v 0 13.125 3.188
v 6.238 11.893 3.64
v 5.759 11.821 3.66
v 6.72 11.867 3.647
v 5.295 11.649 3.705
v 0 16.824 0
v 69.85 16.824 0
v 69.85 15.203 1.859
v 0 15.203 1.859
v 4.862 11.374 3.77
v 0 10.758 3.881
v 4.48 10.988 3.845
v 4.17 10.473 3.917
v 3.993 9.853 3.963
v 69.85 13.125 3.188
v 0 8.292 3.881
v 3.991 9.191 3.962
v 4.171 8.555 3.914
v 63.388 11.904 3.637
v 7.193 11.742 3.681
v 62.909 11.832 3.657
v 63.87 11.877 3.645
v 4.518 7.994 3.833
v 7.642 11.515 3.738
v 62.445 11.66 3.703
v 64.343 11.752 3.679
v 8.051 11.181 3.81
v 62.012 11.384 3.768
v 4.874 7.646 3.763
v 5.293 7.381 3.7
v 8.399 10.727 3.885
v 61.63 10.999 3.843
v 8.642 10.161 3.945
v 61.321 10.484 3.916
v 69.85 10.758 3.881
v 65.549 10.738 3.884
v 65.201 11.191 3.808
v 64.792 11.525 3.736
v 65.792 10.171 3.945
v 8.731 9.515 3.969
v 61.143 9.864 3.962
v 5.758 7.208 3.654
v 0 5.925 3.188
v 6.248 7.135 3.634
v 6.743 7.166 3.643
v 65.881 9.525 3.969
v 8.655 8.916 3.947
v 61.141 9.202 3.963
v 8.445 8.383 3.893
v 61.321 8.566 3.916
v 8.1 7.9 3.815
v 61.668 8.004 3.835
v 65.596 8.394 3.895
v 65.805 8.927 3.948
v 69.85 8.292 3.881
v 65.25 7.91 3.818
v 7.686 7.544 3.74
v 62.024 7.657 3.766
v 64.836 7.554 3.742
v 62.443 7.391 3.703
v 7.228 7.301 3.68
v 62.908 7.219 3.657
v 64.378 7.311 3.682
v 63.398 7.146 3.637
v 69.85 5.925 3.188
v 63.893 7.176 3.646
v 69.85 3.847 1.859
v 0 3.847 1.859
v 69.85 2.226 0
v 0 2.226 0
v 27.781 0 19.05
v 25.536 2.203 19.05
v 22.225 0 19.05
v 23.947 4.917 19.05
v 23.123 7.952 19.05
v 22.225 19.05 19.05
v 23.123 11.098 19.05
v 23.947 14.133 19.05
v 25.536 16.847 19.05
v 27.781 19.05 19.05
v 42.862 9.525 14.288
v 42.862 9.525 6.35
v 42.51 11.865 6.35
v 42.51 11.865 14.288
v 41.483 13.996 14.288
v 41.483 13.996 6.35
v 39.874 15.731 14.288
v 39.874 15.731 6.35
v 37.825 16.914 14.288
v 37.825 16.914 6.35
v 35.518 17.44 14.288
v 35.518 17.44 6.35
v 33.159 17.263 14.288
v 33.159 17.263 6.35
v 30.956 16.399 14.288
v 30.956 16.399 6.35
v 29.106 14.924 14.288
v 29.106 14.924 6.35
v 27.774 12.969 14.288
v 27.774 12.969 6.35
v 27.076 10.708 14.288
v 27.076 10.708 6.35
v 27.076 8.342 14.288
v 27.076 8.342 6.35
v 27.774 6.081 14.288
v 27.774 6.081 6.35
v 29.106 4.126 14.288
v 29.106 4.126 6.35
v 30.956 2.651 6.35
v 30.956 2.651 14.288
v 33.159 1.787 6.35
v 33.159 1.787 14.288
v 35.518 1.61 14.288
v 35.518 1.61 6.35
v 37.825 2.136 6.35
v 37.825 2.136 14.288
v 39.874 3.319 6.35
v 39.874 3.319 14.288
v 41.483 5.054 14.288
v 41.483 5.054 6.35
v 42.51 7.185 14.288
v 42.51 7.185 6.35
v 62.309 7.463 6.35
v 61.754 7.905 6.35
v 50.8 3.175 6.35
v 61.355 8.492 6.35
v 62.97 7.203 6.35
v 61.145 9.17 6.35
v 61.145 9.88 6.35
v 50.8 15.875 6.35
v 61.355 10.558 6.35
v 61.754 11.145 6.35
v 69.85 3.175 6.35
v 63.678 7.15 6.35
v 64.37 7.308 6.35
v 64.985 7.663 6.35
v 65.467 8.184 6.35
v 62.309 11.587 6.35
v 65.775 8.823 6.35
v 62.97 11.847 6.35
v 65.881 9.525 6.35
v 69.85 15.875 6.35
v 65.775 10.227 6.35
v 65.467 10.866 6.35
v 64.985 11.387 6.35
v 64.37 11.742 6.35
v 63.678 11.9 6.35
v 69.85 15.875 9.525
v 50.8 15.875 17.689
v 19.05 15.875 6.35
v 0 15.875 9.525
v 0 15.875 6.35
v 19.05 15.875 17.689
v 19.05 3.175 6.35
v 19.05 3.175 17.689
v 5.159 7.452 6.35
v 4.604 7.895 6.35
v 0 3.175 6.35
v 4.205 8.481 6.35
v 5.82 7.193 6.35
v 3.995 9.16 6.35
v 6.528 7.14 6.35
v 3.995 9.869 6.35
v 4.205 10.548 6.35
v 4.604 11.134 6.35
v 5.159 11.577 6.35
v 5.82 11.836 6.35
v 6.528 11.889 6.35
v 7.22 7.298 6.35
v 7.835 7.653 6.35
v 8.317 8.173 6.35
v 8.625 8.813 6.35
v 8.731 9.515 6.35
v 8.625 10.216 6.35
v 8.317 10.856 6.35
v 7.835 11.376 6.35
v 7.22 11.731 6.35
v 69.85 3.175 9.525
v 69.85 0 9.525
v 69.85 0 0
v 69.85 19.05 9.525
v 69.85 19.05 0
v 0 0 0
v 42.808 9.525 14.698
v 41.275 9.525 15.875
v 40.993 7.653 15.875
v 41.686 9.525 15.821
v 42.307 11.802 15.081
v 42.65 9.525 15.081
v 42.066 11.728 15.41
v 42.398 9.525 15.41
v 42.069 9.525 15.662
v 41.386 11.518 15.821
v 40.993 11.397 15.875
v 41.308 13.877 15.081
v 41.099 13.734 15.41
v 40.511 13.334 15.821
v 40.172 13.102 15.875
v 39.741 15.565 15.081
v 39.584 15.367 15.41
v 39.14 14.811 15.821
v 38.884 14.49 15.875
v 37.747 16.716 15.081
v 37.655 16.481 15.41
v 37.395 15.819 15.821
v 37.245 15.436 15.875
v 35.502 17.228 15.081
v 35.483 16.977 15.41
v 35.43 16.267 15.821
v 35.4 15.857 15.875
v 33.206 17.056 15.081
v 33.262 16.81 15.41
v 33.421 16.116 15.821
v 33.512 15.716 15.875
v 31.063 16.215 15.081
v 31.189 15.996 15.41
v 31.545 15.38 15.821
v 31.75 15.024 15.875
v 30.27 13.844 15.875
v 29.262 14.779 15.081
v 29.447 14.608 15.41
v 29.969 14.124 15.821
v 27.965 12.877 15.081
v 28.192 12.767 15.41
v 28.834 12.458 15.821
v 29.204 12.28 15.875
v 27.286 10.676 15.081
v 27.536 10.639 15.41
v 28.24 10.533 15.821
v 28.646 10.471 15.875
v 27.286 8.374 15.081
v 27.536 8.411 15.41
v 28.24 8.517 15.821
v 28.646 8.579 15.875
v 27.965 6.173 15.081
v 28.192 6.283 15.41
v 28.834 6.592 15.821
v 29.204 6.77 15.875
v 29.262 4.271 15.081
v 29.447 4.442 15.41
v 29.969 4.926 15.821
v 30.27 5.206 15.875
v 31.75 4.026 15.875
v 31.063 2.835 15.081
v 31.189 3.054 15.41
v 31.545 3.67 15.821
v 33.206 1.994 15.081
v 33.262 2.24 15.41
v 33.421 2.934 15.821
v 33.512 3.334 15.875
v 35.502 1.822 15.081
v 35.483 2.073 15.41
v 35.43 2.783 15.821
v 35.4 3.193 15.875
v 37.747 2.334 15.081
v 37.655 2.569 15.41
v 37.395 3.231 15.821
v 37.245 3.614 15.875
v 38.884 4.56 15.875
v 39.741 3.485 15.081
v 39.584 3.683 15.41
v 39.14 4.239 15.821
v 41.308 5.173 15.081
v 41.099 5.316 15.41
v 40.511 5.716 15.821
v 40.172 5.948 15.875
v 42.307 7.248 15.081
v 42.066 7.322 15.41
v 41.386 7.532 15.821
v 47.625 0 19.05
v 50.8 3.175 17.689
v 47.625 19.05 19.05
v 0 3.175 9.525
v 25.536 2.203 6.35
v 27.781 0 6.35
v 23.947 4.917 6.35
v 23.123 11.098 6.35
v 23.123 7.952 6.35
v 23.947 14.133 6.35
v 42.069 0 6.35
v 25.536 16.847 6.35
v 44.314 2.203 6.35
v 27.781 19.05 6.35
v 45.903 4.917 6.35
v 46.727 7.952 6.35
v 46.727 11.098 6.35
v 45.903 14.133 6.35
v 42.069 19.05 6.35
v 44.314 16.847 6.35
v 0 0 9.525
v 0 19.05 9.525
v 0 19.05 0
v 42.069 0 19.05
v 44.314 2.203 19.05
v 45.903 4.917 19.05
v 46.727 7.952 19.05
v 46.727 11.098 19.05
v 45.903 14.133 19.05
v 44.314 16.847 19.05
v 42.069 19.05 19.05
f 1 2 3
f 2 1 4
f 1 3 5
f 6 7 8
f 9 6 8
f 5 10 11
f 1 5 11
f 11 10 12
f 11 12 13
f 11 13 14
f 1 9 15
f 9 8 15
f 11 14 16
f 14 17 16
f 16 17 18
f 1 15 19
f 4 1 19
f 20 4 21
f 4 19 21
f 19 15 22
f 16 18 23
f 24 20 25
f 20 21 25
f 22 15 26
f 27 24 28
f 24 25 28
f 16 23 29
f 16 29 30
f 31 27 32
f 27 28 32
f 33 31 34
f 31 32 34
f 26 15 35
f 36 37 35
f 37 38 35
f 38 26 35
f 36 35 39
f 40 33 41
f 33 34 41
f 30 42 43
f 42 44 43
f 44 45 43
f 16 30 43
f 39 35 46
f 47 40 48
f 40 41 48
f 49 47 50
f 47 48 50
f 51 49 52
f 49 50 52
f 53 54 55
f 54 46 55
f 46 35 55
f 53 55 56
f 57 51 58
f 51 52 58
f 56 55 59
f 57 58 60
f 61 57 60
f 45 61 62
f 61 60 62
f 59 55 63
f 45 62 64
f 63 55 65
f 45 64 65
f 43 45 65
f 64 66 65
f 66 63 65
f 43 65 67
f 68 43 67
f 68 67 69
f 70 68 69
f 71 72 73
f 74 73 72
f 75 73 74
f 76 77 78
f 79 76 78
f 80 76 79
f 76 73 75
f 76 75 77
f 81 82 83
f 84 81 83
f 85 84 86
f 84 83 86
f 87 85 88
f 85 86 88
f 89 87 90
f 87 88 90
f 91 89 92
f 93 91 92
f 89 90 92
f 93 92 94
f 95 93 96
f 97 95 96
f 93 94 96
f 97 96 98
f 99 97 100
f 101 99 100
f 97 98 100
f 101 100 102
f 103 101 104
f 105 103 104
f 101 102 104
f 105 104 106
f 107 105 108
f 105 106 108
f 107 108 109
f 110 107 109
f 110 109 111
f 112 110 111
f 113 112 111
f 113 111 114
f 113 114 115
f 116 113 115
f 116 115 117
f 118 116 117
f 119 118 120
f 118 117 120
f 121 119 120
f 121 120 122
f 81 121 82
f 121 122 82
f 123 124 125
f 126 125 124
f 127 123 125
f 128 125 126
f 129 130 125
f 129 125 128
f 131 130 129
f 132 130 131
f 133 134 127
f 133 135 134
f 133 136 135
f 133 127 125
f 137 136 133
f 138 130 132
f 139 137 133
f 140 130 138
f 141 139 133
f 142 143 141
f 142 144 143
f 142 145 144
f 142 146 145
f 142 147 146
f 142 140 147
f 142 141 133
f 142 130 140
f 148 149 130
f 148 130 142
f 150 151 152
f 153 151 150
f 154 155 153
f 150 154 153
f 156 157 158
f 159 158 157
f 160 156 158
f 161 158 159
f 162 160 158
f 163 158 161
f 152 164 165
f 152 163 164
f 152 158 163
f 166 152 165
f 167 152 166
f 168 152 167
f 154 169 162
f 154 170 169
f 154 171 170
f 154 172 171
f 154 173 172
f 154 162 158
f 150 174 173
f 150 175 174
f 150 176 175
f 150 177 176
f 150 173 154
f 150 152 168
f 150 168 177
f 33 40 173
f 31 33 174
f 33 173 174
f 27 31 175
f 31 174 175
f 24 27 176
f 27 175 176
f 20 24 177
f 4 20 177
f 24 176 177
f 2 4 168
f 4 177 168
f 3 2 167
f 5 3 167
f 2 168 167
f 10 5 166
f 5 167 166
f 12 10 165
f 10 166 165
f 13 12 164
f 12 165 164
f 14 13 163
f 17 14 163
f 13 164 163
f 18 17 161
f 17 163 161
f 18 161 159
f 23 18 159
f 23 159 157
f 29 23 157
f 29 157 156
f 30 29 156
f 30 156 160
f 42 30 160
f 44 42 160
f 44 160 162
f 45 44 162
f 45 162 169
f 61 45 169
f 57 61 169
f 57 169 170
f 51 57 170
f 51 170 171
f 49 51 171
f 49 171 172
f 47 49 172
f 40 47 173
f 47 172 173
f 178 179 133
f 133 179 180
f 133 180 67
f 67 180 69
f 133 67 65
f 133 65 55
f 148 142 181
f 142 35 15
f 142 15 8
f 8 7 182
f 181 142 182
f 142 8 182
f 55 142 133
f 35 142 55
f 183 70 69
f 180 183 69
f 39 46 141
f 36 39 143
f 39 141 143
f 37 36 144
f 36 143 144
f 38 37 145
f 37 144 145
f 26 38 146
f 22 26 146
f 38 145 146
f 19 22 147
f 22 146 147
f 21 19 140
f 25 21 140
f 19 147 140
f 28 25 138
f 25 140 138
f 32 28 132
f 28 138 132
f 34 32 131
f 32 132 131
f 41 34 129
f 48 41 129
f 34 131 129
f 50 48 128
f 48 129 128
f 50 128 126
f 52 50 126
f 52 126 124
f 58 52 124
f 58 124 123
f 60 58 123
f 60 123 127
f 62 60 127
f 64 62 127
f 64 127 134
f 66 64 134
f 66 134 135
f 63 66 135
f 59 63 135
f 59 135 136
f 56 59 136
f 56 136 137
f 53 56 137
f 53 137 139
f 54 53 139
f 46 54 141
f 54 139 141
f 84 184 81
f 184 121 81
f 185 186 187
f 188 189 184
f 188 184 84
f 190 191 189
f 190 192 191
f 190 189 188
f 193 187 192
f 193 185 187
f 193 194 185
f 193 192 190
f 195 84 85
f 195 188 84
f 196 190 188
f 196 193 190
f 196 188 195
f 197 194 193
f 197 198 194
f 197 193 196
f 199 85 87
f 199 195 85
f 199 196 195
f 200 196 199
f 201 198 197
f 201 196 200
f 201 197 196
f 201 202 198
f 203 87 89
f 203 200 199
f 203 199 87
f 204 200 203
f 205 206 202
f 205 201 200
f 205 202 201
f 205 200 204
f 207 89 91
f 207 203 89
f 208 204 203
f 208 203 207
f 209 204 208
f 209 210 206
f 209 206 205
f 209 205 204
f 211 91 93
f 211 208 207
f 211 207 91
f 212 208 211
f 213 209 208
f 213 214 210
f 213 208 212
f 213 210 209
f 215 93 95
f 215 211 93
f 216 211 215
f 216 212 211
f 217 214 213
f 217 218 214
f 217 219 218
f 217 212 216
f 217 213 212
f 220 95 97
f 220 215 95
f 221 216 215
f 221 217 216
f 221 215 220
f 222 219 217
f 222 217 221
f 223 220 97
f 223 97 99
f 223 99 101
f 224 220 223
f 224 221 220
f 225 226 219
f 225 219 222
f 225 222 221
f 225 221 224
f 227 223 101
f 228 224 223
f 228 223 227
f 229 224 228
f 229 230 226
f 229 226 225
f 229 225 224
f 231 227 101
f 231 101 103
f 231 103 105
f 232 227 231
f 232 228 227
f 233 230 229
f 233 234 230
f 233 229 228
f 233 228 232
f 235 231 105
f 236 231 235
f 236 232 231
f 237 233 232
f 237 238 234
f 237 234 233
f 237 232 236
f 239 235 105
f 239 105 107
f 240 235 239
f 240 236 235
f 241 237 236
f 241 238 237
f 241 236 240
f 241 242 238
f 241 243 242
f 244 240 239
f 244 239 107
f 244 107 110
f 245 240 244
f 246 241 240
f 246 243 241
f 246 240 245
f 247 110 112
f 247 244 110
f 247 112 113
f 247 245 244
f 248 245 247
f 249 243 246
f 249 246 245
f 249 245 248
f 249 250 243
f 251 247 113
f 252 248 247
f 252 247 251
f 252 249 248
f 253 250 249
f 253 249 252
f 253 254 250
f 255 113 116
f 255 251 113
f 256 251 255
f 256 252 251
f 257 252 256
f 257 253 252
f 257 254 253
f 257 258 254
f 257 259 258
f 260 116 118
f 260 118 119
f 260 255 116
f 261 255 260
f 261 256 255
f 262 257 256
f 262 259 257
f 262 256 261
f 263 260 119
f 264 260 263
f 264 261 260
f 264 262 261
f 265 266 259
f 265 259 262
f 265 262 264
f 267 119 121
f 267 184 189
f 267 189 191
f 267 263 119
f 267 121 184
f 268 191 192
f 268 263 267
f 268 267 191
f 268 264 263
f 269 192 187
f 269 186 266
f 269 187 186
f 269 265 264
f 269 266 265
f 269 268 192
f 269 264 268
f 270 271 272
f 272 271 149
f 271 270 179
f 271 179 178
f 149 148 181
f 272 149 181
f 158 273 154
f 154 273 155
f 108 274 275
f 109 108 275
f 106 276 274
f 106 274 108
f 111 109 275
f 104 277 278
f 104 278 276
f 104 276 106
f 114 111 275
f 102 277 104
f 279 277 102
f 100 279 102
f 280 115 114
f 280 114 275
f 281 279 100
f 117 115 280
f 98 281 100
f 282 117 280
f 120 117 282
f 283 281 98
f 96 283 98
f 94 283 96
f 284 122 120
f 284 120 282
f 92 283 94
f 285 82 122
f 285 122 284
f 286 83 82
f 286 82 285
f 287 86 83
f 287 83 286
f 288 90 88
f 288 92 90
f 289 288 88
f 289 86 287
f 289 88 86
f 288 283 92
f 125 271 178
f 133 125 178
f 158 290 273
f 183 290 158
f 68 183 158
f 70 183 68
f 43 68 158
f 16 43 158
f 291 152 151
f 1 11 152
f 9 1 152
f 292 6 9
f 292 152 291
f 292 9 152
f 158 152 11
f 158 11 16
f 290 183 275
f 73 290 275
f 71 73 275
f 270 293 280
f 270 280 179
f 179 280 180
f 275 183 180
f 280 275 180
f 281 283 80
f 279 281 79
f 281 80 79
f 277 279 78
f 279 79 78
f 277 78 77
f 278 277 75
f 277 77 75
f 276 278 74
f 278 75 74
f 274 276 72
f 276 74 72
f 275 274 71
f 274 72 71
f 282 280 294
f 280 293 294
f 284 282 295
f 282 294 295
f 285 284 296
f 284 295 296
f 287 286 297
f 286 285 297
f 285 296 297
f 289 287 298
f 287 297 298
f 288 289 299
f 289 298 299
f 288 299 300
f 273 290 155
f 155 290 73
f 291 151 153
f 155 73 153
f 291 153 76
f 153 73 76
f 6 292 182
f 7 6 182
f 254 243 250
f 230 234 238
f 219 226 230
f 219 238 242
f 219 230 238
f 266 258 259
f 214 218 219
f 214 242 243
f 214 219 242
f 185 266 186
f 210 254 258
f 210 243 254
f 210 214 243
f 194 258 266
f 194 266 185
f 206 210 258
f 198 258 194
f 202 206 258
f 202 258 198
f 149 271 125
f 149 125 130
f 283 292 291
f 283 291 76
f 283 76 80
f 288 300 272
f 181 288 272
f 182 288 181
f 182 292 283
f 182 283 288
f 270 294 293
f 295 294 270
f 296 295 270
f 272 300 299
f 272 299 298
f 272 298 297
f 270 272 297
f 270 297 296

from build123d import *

# Parameters (mm, degrees)
F0_W         = 69.85
F0_H         = 19.05
F1_DEPTH     = 19.05
F2_R         = 11.90625
F3_DEPTH     = 12.7
F4_R         = 7.9375
F5_DEPTH     = 9.525
F6_W         = 38.1
F6_H         = 12.7
F7_DEPTH     = 12.7
F8_R         = 2.38125
F9_DEPTH     = 25.4
F10_R        = 8.6959968999
F11_DEPTH    = 69.851
F12_R        = 1.5875
F13_C1_SIZE2 = 9.525
F13_C1_SIZE  = 22.225
F13_C2_SIZE2 = 22.225
F13_C2_SIZE  = 9.525


# Not quite as in the source:
# - two fillets or chamfers of one size are made in one step


with BuildPart() as f1:
    # F0 (on Top) → F1 (new body)
    with BuildSketch(Plane.XY):
        with Locations((34.925, 9.525)):
            Rectangle(F0_W, F0_H)
    extrude(amount=F1_DEPTH)

    # F2 (on face) → F3 (cut)
    with BuildSketch(Plane.XY.offset(19.05)):
        with Locations((34.925, 9.525)):
            Circle(F2_R)
    extrude(amount=-F3_DEPTH, mode=Mode.SUBTRACT)

    # F4 (on face) → F5 (join)
    with BuildSketch(Plane.XY.offset(6.35)):
        with Locations((34.925, 9.525)):
            Circle(F4_R)
    extrude(amount=F5_DEPTH)

    # F6 (on face) → F7 (cut)
    with BuildSketch(Plane.XY.offset(19.05)):
        with Locations((69.85, 9.525)):
            Rectangle(F6_W, F6_H)
        with Locations((0, 9.525)):
            Rectangle(F6_W, F6_H)
    extrude(amount=-F7_DEPTH, mode=Mode.SUBTRACT)

    # F8 (on face) → F9 (cut)
    with BuildSketch(Plane.XY.offset(6.35)):
        with Locations((63.5, 9.525)):
            Circle(F8_R)
        with Locations((6.35, 9.5145329833)):
            Circle(F8_R)
    extrude(amount=-F9_DEPTH, mode=Mode.SUBTRACT)

    # F10 (on face) → F11 (cut, through all)
    with BuildSketch(Plane.YZ.offset(69.85)):
        with Locations((9.525, -4.7272468999)):
            Circle(F10_R)
    extrude(amount=-F11_DEPTH, mode=Mode.SUBTRACT)

    # F12
    f12_edges = [f1.edges().sort_by_distance(p)[0] for p in [
        (26.9875, 9.525, 15.875),
    ]]
    fillet(f12_edges, radius=F12_R)

    # F13: chamfer of 9.525 x 22.225 on 4 edges, made by hand

    # F13_c1
    f13_c1_edges = [f1.edges().sort_by_distance(p)[0] for p in [
        (69.85, 17.4625, 19.05),
    ]]
    f13_c1_side = f1.faces().sort_by_distance((69.6595, 17.4625, 19.05))[0]
    chamfer(f13_c1_edges, length=F13_C1_SIZE, length2=F13_C1_SIZE2, reference=f13_c1_side)

    # F13_c2
    f13_c2_edges = [f1.edges().sort_by_distance(p)[0] for p in [
        (0, 1.5875, 19.05),
    ]]
    f13_c2_side = f1.faces().sort_by_distance((0, 1.5875, 18.8595))[0]
    chamfer(f13_c2_edges, length=F13_C2_SIZE, length2=F13_C2_SIZE2, reference=f13_c2_side)


solid = f1.part
